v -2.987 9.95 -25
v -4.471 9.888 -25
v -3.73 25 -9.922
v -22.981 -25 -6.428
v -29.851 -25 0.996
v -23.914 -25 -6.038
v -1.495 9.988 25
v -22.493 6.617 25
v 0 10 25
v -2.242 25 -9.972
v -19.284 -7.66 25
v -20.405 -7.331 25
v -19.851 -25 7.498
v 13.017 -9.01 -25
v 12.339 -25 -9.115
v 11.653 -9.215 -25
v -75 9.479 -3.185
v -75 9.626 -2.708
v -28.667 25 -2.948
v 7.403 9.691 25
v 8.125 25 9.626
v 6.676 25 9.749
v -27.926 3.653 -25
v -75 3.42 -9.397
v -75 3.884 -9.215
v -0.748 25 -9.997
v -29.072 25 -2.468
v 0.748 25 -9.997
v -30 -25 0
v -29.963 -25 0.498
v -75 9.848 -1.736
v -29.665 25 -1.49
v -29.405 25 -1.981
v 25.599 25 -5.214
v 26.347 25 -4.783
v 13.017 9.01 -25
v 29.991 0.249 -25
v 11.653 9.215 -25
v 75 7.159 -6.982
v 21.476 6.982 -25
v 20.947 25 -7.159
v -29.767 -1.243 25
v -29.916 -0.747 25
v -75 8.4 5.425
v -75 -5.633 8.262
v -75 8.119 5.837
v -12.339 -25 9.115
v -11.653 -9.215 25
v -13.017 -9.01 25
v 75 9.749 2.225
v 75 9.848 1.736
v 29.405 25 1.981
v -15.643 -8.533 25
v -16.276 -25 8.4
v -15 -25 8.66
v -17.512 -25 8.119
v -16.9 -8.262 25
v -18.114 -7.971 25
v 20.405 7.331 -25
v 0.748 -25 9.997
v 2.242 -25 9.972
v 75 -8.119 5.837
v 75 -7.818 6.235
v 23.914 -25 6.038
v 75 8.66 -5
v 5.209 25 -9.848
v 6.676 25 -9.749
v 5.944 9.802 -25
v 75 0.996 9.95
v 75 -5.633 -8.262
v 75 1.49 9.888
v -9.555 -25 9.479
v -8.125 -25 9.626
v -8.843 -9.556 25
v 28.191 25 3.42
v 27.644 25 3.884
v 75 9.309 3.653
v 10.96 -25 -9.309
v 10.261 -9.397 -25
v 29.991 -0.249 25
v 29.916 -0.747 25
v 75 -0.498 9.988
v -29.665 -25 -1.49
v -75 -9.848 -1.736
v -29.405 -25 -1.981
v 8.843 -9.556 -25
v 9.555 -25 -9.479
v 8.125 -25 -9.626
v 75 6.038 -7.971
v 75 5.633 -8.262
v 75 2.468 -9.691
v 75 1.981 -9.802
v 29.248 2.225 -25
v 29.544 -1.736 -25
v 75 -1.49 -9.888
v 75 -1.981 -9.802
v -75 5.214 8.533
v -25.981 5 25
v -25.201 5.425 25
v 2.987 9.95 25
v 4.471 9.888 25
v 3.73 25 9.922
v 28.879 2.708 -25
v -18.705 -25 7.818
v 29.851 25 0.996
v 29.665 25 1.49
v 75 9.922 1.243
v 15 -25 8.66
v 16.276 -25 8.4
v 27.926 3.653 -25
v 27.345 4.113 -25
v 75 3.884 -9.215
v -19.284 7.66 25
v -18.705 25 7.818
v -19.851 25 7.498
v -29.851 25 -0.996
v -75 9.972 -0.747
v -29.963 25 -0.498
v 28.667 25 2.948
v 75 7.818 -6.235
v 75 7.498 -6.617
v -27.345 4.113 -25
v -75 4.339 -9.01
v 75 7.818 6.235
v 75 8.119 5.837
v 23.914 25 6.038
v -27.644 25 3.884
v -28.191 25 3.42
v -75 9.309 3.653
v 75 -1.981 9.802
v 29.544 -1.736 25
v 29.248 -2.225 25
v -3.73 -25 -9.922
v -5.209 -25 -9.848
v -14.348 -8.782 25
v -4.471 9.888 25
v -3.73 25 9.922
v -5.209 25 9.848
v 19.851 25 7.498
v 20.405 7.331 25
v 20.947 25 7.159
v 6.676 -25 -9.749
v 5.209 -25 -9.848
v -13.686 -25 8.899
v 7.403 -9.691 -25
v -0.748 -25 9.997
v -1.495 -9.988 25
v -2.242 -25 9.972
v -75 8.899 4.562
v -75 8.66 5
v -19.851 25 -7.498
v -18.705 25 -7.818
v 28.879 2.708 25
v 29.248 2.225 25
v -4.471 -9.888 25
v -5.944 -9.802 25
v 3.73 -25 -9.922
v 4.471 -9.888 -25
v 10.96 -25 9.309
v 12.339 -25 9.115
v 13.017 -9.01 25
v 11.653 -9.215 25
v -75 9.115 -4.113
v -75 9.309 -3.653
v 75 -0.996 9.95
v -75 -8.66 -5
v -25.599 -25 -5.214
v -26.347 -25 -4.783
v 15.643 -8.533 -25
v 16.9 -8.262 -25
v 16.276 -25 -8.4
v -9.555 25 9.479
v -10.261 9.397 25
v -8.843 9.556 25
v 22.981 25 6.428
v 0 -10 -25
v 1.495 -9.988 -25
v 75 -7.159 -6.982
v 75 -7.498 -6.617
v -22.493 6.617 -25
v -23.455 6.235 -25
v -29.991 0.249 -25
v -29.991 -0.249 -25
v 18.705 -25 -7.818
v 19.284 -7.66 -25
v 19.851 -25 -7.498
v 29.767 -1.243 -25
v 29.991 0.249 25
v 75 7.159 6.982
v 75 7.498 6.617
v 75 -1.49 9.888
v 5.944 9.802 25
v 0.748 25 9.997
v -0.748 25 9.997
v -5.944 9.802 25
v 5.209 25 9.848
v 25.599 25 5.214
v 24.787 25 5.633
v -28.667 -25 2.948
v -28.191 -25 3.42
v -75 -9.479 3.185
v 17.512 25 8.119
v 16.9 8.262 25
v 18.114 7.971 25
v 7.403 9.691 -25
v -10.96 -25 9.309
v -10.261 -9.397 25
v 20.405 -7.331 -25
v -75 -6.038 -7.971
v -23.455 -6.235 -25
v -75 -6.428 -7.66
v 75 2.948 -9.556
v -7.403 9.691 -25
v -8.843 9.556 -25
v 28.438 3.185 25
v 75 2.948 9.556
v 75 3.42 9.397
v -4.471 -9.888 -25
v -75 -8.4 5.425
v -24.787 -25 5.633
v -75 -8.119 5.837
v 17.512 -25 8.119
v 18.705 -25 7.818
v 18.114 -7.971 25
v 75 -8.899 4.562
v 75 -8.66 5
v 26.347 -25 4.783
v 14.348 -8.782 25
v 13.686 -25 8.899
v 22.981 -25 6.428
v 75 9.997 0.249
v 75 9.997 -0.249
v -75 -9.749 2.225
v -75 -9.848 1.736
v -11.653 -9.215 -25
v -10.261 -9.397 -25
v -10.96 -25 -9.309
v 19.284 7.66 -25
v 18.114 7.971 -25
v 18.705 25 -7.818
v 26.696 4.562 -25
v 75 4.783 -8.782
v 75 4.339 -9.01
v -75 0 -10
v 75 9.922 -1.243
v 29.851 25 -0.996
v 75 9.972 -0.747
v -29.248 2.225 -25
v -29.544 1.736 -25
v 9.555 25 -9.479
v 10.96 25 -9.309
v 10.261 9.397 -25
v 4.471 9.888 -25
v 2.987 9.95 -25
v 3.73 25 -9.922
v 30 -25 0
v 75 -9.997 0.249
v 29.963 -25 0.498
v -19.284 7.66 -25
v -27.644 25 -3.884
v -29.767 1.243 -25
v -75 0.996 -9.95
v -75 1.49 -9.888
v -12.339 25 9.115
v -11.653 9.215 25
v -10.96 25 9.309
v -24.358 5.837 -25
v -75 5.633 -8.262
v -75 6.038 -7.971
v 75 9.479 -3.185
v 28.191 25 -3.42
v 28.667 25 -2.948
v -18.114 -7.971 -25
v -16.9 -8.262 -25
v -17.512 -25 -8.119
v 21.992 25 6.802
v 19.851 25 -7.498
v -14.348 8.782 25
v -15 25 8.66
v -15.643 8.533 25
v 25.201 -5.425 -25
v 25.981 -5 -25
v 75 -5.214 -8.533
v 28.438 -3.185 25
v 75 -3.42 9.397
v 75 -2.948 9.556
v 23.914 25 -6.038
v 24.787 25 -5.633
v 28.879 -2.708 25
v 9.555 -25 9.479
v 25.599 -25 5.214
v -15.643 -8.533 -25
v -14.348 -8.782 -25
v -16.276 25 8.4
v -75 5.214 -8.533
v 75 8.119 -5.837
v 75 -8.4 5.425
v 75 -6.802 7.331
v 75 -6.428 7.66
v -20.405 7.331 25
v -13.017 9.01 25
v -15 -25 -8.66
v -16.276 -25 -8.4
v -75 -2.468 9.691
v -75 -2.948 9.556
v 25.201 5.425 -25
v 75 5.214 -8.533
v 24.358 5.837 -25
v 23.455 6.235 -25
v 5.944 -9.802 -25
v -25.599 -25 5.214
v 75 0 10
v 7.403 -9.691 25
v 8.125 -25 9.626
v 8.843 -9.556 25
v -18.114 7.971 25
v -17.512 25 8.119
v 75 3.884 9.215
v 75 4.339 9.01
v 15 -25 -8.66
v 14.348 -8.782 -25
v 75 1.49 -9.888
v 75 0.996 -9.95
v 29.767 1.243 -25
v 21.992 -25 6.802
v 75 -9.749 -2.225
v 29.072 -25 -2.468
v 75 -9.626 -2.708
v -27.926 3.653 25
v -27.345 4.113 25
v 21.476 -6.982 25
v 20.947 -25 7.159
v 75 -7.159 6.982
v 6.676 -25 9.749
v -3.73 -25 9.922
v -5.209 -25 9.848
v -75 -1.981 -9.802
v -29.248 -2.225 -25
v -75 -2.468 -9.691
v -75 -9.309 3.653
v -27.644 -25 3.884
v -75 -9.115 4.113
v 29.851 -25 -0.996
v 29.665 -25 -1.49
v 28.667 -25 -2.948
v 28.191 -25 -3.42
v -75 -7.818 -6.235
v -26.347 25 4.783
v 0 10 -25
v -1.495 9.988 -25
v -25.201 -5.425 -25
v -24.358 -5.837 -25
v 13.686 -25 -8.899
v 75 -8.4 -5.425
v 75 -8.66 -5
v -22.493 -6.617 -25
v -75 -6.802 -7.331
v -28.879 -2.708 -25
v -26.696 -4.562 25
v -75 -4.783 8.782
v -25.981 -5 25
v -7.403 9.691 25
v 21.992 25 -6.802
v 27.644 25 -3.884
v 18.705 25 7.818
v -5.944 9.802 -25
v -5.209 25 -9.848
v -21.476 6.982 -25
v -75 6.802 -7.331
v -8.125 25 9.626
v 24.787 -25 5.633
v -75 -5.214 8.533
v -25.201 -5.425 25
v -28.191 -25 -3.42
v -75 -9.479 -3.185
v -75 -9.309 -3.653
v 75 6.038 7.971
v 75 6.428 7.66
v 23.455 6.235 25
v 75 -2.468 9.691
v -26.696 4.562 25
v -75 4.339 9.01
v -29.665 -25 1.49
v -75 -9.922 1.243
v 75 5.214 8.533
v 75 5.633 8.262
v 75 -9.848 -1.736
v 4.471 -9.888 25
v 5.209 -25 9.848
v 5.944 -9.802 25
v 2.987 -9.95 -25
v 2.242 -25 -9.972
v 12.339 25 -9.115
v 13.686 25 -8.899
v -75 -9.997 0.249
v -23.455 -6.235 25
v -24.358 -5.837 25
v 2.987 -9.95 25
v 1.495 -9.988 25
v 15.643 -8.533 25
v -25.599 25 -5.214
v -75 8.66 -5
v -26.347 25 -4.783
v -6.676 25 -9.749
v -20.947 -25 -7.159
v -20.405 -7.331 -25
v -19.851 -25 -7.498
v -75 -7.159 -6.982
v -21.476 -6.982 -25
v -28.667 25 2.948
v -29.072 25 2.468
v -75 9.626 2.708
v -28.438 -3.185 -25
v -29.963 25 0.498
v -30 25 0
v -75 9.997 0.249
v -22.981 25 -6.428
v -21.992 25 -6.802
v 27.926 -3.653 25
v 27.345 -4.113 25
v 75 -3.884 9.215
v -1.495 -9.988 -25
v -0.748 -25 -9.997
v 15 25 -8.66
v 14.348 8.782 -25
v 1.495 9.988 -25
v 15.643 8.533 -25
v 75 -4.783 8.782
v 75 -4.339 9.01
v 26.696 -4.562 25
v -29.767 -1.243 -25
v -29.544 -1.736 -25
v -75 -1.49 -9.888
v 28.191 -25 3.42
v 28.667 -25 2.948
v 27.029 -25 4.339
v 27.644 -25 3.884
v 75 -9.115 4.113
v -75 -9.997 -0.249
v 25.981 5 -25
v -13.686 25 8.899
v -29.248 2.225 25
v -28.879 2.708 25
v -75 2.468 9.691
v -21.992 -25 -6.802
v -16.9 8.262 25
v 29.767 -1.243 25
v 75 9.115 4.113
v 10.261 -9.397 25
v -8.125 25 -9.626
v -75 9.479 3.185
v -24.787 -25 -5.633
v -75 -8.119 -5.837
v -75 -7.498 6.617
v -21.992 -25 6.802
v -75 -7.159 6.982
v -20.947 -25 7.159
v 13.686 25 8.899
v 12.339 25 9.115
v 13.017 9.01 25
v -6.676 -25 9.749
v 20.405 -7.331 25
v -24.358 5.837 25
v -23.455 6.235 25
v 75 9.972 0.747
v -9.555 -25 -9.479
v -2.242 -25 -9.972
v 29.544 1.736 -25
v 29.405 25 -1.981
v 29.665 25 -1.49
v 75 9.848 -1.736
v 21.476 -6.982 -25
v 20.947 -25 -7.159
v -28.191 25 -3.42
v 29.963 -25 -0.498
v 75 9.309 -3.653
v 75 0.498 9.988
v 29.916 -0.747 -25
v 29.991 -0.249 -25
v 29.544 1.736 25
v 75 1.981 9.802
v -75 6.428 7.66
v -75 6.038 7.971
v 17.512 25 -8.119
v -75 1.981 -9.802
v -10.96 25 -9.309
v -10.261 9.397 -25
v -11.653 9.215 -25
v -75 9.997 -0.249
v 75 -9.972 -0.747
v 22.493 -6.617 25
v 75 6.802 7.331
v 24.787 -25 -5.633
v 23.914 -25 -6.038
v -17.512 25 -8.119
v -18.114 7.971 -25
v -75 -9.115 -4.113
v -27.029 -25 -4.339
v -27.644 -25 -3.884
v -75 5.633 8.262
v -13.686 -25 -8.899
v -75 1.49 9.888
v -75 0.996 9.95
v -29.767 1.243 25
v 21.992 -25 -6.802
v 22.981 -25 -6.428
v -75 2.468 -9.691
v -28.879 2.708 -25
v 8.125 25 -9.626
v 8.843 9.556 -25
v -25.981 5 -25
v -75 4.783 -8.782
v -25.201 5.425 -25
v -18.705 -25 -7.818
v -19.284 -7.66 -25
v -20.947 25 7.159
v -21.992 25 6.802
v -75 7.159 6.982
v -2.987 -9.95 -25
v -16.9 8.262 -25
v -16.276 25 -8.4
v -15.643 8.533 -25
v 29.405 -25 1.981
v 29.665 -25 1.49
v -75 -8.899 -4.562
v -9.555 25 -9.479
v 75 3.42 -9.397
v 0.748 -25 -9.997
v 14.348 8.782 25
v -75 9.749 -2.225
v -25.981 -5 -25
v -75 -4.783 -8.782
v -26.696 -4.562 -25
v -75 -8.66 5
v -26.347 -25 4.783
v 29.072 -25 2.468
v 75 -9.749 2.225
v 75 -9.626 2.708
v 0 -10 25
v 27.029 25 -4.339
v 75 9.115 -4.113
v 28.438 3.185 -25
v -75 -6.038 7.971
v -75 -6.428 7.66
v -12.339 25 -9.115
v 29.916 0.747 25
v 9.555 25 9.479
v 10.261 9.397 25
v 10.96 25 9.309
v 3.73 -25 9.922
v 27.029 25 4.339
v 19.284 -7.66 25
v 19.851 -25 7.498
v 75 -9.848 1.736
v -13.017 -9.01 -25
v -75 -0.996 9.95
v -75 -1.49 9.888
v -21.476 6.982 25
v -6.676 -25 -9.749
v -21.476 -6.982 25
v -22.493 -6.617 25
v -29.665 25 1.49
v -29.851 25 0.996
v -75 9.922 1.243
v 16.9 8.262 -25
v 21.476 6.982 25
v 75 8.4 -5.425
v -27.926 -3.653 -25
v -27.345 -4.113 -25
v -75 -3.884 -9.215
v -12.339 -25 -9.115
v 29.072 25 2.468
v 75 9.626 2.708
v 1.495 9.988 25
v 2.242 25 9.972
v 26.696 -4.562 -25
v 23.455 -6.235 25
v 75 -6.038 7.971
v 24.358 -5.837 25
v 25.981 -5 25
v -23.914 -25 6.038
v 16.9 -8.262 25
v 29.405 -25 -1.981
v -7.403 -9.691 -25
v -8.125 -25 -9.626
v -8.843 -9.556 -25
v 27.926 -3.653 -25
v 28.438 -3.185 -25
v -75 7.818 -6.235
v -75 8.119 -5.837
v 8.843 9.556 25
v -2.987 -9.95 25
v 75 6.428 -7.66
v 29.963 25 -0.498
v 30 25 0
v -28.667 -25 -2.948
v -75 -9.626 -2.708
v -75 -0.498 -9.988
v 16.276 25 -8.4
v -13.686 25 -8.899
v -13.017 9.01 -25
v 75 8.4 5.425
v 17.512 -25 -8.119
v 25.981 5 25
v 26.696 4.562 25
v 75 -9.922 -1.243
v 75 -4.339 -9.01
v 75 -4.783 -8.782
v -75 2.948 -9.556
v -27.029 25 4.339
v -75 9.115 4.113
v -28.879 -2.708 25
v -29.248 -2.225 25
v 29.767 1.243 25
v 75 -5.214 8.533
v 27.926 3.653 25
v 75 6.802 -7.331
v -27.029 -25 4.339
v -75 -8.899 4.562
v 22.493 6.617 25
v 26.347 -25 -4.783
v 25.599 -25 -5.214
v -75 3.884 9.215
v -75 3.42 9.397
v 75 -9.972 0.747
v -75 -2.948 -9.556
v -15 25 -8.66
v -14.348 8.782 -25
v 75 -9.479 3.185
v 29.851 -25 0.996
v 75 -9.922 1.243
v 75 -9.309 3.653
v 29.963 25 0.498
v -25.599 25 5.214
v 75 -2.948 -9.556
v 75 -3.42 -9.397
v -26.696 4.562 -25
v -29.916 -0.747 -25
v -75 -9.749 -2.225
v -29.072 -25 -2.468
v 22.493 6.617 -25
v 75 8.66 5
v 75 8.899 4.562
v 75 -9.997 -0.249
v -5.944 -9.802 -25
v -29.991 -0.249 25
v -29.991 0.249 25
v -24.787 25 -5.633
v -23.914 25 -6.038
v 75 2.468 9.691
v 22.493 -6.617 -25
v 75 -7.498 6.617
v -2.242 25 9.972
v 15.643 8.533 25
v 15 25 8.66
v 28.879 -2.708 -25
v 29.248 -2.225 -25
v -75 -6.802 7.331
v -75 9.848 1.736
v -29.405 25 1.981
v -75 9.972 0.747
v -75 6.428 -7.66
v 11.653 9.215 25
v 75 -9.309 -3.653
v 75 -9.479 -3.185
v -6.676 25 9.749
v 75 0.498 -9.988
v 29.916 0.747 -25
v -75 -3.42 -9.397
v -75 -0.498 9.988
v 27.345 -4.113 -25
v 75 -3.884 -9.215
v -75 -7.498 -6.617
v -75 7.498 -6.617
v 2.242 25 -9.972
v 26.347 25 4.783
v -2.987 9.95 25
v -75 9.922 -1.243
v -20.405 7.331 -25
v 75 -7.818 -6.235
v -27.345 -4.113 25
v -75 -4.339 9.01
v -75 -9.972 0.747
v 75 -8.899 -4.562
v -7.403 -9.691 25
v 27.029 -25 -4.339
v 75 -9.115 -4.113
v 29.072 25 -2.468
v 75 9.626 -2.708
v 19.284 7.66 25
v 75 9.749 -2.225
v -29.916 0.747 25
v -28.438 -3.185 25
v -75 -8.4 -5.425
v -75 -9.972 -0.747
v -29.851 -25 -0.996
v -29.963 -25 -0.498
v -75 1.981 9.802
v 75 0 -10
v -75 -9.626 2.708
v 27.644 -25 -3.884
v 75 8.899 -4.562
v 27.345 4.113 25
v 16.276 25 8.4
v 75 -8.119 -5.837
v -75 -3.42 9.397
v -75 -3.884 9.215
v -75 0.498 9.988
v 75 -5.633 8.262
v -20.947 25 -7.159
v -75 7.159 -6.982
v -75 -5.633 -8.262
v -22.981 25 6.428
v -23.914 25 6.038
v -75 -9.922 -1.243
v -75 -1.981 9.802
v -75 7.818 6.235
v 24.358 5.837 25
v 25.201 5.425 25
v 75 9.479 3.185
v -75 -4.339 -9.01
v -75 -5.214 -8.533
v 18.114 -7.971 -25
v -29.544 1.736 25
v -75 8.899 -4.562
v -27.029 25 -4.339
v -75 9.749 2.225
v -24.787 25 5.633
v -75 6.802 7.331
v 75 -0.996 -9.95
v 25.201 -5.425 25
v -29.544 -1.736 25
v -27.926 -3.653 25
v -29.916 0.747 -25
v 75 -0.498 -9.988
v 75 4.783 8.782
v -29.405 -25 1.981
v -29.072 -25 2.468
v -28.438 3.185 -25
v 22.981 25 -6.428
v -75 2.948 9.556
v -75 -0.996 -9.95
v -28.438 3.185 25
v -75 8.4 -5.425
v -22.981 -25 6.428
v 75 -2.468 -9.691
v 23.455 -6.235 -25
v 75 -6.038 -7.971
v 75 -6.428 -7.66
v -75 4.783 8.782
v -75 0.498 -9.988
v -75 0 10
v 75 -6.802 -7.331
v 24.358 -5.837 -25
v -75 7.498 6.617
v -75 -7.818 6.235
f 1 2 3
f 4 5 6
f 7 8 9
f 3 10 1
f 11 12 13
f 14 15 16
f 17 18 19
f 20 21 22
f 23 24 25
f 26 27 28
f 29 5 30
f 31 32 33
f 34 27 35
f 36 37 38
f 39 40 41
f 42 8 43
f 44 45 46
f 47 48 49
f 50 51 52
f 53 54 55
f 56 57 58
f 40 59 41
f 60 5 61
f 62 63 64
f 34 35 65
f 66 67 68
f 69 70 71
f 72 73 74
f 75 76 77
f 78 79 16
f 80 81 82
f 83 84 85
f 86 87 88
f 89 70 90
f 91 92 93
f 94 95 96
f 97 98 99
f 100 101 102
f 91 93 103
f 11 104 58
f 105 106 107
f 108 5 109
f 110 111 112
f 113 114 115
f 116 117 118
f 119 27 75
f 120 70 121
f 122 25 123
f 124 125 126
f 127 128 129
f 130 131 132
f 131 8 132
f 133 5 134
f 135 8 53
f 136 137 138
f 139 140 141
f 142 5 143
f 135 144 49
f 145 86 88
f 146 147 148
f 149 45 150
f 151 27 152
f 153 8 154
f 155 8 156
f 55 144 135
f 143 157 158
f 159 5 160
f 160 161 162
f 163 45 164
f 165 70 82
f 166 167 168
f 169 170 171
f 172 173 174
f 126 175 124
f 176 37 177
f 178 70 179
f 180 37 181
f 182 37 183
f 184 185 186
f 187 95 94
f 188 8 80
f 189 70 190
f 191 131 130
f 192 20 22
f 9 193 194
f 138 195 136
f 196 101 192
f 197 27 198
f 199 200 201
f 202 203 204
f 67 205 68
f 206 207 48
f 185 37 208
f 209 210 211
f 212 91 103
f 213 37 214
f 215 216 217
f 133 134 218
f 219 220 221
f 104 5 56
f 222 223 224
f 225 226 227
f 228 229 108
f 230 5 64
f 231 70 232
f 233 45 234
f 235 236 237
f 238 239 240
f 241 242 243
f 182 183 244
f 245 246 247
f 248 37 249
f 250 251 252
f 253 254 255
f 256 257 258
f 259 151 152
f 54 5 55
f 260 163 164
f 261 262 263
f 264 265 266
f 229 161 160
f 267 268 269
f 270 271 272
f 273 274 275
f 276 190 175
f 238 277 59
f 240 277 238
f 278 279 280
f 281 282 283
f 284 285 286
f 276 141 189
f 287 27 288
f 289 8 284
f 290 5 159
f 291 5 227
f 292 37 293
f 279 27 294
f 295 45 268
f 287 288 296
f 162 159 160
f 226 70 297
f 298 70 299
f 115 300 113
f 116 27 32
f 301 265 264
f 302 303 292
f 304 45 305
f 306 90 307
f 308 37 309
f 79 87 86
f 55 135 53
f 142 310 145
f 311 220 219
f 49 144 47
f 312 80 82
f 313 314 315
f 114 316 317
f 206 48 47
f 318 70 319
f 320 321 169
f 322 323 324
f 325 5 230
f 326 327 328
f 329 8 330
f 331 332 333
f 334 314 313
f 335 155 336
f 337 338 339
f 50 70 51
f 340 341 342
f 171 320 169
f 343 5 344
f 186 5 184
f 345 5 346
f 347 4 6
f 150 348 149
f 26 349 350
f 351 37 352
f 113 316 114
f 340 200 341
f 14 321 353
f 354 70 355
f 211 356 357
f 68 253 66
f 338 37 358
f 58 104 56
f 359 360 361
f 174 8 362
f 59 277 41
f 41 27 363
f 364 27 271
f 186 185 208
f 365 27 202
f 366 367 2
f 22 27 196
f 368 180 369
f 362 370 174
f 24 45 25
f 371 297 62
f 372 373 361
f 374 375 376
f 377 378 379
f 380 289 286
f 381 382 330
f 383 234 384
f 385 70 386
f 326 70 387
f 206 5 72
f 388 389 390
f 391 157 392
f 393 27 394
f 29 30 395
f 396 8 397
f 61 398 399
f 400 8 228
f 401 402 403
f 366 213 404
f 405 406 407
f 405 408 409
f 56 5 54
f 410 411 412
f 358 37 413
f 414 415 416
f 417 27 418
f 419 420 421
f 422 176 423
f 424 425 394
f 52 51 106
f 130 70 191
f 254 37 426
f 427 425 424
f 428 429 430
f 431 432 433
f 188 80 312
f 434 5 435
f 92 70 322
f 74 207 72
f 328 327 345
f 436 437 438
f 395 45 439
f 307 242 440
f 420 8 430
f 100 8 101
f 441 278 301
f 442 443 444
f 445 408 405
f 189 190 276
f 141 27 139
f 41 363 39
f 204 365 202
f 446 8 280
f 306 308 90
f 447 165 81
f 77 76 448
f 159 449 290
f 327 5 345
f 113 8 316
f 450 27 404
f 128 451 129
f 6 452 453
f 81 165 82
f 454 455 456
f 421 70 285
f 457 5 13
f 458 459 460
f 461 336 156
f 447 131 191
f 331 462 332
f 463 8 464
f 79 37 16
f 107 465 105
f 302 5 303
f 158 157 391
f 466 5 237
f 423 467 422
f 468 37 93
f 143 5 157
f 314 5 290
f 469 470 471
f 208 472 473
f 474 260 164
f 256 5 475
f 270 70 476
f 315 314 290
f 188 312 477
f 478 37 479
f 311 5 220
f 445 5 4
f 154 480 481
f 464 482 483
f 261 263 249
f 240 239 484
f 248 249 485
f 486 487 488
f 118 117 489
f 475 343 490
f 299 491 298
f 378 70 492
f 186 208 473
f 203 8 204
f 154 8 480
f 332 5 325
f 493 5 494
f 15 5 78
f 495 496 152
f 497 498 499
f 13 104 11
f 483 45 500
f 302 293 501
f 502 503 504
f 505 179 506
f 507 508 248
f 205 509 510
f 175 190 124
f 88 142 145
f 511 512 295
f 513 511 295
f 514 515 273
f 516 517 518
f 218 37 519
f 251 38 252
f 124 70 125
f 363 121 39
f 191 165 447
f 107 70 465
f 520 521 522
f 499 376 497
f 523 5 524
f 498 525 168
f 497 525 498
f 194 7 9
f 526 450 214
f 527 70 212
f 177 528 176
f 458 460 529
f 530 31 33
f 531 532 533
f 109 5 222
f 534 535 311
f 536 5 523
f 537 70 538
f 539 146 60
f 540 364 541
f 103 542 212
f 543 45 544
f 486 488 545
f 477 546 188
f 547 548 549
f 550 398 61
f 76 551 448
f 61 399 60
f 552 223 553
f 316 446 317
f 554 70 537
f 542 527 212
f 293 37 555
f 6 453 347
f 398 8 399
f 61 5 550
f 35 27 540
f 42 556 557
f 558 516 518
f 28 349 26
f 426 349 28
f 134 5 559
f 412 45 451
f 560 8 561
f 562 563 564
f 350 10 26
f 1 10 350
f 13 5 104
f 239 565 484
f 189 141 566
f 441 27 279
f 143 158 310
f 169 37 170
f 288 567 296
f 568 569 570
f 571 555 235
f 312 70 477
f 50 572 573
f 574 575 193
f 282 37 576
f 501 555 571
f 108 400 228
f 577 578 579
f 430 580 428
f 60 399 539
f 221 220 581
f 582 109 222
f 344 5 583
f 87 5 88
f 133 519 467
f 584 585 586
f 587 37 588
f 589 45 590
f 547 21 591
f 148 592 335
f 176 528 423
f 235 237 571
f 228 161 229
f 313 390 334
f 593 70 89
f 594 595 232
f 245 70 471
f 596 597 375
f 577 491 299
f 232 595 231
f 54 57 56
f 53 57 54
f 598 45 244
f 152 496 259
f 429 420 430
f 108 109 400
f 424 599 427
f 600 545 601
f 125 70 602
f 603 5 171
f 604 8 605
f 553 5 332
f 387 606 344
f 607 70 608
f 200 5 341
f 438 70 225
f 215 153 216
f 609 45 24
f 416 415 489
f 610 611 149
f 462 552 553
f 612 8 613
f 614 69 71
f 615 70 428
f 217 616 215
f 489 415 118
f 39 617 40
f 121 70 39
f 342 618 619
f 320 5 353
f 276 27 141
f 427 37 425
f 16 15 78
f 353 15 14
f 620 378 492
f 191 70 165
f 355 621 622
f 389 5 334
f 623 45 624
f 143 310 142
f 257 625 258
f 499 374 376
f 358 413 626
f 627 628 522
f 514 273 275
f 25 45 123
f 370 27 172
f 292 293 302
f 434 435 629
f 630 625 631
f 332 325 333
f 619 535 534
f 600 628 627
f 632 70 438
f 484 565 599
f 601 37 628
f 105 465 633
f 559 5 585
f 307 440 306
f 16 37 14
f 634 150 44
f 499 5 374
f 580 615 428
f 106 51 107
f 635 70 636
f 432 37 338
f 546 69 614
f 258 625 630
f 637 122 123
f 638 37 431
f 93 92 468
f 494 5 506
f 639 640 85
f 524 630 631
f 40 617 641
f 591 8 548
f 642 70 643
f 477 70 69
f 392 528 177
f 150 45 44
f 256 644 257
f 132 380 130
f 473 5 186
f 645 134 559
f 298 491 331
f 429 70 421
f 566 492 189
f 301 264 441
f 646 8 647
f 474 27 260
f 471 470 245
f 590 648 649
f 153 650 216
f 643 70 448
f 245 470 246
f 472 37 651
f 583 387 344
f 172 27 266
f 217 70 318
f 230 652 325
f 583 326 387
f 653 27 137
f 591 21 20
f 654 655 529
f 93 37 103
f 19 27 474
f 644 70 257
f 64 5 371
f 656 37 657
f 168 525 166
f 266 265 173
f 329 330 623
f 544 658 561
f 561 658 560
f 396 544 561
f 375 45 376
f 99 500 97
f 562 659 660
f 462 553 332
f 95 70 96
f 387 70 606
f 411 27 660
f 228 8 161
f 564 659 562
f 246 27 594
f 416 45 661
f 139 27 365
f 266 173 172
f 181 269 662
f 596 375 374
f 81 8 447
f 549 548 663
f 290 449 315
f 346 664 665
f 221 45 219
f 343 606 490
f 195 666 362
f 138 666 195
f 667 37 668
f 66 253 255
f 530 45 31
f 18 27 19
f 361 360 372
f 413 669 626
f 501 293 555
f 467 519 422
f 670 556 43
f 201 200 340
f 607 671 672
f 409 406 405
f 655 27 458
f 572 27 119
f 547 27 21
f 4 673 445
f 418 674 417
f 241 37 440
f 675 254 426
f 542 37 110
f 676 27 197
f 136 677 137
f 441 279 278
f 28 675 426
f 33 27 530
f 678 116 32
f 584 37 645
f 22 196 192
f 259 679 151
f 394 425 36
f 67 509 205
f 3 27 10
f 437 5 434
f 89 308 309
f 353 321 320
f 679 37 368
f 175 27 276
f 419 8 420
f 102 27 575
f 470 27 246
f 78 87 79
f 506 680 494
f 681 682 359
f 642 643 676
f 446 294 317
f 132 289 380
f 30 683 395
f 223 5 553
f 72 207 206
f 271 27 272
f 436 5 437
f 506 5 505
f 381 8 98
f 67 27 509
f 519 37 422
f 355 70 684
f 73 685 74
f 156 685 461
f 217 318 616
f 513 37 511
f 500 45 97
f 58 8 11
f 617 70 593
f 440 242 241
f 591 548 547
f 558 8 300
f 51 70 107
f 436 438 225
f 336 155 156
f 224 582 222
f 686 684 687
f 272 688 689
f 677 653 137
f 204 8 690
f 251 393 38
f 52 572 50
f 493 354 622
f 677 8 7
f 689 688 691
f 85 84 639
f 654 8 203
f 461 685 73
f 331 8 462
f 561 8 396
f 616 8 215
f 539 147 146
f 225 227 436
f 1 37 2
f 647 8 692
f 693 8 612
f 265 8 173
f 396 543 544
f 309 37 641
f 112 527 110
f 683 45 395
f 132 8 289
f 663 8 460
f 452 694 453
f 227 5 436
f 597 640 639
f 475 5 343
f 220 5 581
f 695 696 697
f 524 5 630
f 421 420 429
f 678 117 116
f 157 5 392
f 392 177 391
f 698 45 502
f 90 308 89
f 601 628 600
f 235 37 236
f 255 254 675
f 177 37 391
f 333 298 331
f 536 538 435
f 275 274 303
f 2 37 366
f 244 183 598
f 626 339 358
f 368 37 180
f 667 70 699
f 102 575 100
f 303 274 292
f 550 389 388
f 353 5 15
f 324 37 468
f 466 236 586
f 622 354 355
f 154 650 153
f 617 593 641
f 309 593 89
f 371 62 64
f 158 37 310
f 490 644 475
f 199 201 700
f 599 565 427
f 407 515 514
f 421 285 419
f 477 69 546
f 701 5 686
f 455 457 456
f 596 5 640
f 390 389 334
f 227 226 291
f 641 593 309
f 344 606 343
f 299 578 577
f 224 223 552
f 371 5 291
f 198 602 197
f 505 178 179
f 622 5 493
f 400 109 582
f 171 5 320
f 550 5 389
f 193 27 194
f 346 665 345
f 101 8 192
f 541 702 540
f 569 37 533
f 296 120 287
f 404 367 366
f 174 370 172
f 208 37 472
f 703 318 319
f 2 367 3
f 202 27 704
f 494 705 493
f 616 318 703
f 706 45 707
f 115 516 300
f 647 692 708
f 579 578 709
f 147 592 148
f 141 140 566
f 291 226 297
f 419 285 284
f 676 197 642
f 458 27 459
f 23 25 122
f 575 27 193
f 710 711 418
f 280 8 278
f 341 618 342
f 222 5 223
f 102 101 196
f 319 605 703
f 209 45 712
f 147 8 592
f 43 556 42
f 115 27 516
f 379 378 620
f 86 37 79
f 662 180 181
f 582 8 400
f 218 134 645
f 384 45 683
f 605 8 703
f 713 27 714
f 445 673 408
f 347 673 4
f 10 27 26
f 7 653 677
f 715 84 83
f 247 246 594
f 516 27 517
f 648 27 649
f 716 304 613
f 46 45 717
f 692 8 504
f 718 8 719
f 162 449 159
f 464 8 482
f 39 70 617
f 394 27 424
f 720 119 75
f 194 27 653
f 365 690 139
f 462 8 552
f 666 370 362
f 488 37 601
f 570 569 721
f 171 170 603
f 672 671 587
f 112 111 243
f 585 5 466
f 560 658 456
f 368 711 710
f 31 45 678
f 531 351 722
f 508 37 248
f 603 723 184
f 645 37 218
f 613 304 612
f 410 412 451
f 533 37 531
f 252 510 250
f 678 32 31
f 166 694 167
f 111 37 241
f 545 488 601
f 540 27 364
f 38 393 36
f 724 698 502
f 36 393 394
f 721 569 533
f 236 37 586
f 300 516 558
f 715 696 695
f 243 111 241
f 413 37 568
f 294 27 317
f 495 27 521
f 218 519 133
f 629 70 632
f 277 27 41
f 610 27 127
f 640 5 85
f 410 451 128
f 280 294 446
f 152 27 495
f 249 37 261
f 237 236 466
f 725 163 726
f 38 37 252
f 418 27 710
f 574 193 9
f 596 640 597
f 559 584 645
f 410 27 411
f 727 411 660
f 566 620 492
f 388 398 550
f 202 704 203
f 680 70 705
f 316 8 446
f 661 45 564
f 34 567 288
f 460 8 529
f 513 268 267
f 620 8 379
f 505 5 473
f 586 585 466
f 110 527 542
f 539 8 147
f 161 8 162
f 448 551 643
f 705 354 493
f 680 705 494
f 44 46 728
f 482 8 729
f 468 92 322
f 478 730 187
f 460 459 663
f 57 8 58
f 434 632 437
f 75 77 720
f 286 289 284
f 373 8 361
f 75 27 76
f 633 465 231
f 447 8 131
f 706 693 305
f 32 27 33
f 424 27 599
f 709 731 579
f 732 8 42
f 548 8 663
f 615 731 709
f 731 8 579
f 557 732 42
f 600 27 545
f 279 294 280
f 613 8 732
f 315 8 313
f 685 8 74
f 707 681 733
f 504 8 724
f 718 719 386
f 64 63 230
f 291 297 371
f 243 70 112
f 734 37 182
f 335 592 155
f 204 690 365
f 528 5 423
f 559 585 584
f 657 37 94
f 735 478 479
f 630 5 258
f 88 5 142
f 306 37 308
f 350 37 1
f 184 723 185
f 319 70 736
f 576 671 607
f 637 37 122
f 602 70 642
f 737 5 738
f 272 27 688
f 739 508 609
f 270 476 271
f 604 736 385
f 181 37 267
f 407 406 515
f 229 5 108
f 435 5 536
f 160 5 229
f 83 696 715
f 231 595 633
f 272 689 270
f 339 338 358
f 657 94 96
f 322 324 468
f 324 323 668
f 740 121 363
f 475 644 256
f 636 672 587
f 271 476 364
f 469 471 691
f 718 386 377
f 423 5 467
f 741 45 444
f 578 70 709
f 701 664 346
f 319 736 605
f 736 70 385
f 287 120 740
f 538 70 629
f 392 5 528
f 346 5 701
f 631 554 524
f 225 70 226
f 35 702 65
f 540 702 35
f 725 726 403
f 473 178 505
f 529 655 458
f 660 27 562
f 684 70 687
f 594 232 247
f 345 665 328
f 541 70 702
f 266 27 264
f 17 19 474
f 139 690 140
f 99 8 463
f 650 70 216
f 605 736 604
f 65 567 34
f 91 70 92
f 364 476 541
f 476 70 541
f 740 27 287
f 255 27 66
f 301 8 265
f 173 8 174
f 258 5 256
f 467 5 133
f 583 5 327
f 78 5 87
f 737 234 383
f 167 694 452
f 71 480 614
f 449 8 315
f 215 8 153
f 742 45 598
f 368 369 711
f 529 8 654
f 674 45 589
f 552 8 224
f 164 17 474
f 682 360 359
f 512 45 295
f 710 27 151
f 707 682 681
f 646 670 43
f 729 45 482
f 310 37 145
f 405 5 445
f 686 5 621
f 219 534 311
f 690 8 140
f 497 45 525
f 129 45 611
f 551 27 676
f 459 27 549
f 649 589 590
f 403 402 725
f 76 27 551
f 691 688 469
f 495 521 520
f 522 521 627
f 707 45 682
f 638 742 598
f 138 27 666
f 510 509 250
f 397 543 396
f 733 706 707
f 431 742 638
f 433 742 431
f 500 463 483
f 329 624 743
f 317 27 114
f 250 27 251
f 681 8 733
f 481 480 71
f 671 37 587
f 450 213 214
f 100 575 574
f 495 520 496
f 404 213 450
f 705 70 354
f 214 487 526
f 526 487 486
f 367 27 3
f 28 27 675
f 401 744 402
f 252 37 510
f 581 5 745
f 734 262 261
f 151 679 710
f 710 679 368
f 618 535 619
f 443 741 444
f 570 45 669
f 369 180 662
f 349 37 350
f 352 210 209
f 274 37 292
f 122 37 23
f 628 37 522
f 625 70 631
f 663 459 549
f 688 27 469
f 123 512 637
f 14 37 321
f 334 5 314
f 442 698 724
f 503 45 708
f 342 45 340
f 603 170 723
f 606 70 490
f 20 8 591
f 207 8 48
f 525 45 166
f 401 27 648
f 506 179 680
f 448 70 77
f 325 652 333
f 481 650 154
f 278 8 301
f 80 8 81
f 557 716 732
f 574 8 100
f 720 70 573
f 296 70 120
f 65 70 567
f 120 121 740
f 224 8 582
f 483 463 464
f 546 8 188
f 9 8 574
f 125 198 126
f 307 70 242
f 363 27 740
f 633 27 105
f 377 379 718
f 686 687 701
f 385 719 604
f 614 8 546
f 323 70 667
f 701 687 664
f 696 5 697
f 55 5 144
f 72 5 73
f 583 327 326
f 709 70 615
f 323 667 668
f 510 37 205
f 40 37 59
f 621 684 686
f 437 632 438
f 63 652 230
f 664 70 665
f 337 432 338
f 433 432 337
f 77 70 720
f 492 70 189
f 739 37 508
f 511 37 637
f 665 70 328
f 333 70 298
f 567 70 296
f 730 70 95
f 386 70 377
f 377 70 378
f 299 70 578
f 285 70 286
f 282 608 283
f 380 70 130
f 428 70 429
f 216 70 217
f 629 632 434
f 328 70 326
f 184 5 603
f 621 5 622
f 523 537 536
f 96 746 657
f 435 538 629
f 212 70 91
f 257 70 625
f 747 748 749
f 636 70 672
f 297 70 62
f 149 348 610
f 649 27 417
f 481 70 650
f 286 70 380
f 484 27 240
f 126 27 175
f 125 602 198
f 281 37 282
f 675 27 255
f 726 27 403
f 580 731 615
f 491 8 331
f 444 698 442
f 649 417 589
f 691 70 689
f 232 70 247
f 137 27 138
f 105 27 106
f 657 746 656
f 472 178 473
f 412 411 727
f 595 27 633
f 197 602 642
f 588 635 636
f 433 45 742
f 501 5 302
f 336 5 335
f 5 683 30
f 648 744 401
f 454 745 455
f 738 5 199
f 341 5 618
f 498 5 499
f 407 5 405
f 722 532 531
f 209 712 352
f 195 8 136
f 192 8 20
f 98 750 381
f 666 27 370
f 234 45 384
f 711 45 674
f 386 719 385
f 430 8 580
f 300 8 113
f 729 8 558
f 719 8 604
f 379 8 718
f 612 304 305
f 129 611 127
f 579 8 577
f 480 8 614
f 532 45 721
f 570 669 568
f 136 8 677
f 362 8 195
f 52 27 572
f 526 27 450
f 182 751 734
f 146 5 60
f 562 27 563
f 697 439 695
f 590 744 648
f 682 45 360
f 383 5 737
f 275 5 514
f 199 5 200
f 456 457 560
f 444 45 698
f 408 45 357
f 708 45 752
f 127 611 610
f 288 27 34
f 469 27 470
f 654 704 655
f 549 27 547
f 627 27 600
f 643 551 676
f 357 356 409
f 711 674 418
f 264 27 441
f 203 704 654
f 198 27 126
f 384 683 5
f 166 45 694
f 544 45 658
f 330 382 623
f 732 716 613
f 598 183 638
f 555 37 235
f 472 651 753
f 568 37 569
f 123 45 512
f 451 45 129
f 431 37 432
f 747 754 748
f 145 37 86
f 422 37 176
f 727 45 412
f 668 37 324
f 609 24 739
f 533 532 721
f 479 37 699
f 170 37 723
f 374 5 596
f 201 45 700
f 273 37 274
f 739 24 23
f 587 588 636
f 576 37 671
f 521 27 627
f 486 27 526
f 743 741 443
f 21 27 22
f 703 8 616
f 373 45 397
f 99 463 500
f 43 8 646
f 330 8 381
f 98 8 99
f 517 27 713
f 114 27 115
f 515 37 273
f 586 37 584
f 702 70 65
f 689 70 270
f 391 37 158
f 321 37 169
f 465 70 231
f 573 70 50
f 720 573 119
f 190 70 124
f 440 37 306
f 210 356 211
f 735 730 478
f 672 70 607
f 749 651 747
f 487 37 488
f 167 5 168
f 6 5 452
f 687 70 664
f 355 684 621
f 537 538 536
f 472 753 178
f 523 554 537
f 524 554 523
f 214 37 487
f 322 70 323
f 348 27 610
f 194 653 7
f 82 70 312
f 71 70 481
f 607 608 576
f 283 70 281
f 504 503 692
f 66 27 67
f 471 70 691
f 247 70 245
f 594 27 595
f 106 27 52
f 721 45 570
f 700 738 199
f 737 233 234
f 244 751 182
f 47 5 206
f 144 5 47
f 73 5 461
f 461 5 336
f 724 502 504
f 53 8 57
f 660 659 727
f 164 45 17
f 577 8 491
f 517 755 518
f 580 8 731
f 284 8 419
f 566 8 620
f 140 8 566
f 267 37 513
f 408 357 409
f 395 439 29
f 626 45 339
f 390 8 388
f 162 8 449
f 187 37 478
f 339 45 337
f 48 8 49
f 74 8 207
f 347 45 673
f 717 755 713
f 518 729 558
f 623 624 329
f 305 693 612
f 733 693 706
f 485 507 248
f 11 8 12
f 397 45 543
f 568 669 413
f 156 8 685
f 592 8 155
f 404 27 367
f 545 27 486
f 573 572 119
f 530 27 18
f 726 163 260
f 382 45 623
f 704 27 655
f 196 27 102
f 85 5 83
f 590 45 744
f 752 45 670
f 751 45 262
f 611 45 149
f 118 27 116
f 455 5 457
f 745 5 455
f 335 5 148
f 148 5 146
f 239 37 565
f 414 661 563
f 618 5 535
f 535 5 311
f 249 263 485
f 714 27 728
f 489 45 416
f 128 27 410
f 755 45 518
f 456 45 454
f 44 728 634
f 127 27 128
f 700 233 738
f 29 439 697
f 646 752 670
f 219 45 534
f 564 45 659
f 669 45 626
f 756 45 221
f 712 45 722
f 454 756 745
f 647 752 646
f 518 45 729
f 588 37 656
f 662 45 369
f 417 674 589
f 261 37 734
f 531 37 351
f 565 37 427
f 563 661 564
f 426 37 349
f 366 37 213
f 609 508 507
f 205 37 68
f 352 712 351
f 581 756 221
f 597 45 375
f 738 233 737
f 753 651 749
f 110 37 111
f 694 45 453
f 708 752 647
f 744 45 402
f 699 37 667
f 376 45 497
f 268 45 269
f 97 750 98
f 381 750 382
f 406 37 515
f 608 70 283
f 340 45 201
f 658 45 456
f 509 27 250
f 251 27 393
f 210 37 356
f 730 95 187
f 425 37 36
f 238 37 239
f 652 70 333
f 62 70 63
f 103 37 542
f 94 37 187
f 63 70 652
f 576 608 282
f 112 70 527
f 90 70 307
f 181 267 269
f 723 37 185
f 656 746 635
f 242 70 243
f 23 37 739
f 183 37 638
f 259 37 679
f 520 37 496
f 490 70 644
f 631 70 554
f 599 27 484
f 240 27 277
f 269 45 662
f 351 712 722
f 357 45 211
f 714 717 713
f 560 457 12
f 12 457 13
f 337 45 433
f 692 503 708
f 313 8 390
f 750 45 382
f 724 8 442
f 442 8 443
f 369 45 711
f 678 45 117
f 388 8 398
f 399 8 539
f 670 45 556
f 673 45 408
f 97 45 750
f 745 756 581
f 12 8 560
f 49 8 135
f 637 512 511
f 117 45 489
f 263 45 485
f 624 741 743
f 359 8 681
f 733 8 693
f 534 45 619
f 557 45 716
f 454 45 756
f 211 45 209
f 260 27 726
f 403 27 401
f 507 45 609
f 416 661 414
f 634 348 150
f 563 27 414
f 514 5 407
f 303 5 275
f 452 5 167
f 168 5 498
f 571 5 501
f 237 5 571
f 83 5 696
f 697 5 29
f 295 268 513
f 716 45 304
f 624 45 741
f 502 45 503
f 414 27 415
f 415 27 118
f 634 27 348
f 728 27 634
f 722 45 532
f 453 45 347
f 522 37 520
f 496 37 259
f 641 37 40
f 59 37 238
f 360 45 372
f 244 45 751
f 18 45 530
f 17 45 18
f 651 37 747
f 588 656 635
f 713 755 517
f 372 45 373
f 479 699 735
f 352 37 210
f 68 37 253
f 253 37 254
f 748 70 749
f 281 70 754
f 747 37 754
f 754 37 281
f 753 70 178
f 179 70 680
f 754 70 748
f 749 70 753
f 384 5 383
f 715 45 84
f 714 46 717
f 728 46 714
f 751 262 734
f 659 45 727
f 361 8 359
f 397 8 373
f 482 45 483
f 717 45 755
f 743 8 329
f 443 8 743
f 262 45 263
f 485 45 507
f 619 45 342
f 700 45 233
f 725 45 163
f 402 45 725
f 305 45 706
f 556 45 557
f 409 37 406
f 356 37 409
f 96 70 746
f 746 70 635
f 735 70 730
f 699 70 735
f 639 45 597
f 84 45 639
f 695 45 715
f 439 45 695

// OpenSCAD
hull(){
scale([3,1,1]){
rotate([90,0,0]){
cylinder(h=50,center=true,$fa=0.50,$fs=0.50,r=10);
}
rotate([0,90,0]){
cylinder(h=50,center=true,$fa=0.50,$fs=0.50,r=10);
}
rotate([0,0,90]){
cylinder(h=50,center=true,$fa=0.50,$fs=0.50,r=10);
}
}
}
